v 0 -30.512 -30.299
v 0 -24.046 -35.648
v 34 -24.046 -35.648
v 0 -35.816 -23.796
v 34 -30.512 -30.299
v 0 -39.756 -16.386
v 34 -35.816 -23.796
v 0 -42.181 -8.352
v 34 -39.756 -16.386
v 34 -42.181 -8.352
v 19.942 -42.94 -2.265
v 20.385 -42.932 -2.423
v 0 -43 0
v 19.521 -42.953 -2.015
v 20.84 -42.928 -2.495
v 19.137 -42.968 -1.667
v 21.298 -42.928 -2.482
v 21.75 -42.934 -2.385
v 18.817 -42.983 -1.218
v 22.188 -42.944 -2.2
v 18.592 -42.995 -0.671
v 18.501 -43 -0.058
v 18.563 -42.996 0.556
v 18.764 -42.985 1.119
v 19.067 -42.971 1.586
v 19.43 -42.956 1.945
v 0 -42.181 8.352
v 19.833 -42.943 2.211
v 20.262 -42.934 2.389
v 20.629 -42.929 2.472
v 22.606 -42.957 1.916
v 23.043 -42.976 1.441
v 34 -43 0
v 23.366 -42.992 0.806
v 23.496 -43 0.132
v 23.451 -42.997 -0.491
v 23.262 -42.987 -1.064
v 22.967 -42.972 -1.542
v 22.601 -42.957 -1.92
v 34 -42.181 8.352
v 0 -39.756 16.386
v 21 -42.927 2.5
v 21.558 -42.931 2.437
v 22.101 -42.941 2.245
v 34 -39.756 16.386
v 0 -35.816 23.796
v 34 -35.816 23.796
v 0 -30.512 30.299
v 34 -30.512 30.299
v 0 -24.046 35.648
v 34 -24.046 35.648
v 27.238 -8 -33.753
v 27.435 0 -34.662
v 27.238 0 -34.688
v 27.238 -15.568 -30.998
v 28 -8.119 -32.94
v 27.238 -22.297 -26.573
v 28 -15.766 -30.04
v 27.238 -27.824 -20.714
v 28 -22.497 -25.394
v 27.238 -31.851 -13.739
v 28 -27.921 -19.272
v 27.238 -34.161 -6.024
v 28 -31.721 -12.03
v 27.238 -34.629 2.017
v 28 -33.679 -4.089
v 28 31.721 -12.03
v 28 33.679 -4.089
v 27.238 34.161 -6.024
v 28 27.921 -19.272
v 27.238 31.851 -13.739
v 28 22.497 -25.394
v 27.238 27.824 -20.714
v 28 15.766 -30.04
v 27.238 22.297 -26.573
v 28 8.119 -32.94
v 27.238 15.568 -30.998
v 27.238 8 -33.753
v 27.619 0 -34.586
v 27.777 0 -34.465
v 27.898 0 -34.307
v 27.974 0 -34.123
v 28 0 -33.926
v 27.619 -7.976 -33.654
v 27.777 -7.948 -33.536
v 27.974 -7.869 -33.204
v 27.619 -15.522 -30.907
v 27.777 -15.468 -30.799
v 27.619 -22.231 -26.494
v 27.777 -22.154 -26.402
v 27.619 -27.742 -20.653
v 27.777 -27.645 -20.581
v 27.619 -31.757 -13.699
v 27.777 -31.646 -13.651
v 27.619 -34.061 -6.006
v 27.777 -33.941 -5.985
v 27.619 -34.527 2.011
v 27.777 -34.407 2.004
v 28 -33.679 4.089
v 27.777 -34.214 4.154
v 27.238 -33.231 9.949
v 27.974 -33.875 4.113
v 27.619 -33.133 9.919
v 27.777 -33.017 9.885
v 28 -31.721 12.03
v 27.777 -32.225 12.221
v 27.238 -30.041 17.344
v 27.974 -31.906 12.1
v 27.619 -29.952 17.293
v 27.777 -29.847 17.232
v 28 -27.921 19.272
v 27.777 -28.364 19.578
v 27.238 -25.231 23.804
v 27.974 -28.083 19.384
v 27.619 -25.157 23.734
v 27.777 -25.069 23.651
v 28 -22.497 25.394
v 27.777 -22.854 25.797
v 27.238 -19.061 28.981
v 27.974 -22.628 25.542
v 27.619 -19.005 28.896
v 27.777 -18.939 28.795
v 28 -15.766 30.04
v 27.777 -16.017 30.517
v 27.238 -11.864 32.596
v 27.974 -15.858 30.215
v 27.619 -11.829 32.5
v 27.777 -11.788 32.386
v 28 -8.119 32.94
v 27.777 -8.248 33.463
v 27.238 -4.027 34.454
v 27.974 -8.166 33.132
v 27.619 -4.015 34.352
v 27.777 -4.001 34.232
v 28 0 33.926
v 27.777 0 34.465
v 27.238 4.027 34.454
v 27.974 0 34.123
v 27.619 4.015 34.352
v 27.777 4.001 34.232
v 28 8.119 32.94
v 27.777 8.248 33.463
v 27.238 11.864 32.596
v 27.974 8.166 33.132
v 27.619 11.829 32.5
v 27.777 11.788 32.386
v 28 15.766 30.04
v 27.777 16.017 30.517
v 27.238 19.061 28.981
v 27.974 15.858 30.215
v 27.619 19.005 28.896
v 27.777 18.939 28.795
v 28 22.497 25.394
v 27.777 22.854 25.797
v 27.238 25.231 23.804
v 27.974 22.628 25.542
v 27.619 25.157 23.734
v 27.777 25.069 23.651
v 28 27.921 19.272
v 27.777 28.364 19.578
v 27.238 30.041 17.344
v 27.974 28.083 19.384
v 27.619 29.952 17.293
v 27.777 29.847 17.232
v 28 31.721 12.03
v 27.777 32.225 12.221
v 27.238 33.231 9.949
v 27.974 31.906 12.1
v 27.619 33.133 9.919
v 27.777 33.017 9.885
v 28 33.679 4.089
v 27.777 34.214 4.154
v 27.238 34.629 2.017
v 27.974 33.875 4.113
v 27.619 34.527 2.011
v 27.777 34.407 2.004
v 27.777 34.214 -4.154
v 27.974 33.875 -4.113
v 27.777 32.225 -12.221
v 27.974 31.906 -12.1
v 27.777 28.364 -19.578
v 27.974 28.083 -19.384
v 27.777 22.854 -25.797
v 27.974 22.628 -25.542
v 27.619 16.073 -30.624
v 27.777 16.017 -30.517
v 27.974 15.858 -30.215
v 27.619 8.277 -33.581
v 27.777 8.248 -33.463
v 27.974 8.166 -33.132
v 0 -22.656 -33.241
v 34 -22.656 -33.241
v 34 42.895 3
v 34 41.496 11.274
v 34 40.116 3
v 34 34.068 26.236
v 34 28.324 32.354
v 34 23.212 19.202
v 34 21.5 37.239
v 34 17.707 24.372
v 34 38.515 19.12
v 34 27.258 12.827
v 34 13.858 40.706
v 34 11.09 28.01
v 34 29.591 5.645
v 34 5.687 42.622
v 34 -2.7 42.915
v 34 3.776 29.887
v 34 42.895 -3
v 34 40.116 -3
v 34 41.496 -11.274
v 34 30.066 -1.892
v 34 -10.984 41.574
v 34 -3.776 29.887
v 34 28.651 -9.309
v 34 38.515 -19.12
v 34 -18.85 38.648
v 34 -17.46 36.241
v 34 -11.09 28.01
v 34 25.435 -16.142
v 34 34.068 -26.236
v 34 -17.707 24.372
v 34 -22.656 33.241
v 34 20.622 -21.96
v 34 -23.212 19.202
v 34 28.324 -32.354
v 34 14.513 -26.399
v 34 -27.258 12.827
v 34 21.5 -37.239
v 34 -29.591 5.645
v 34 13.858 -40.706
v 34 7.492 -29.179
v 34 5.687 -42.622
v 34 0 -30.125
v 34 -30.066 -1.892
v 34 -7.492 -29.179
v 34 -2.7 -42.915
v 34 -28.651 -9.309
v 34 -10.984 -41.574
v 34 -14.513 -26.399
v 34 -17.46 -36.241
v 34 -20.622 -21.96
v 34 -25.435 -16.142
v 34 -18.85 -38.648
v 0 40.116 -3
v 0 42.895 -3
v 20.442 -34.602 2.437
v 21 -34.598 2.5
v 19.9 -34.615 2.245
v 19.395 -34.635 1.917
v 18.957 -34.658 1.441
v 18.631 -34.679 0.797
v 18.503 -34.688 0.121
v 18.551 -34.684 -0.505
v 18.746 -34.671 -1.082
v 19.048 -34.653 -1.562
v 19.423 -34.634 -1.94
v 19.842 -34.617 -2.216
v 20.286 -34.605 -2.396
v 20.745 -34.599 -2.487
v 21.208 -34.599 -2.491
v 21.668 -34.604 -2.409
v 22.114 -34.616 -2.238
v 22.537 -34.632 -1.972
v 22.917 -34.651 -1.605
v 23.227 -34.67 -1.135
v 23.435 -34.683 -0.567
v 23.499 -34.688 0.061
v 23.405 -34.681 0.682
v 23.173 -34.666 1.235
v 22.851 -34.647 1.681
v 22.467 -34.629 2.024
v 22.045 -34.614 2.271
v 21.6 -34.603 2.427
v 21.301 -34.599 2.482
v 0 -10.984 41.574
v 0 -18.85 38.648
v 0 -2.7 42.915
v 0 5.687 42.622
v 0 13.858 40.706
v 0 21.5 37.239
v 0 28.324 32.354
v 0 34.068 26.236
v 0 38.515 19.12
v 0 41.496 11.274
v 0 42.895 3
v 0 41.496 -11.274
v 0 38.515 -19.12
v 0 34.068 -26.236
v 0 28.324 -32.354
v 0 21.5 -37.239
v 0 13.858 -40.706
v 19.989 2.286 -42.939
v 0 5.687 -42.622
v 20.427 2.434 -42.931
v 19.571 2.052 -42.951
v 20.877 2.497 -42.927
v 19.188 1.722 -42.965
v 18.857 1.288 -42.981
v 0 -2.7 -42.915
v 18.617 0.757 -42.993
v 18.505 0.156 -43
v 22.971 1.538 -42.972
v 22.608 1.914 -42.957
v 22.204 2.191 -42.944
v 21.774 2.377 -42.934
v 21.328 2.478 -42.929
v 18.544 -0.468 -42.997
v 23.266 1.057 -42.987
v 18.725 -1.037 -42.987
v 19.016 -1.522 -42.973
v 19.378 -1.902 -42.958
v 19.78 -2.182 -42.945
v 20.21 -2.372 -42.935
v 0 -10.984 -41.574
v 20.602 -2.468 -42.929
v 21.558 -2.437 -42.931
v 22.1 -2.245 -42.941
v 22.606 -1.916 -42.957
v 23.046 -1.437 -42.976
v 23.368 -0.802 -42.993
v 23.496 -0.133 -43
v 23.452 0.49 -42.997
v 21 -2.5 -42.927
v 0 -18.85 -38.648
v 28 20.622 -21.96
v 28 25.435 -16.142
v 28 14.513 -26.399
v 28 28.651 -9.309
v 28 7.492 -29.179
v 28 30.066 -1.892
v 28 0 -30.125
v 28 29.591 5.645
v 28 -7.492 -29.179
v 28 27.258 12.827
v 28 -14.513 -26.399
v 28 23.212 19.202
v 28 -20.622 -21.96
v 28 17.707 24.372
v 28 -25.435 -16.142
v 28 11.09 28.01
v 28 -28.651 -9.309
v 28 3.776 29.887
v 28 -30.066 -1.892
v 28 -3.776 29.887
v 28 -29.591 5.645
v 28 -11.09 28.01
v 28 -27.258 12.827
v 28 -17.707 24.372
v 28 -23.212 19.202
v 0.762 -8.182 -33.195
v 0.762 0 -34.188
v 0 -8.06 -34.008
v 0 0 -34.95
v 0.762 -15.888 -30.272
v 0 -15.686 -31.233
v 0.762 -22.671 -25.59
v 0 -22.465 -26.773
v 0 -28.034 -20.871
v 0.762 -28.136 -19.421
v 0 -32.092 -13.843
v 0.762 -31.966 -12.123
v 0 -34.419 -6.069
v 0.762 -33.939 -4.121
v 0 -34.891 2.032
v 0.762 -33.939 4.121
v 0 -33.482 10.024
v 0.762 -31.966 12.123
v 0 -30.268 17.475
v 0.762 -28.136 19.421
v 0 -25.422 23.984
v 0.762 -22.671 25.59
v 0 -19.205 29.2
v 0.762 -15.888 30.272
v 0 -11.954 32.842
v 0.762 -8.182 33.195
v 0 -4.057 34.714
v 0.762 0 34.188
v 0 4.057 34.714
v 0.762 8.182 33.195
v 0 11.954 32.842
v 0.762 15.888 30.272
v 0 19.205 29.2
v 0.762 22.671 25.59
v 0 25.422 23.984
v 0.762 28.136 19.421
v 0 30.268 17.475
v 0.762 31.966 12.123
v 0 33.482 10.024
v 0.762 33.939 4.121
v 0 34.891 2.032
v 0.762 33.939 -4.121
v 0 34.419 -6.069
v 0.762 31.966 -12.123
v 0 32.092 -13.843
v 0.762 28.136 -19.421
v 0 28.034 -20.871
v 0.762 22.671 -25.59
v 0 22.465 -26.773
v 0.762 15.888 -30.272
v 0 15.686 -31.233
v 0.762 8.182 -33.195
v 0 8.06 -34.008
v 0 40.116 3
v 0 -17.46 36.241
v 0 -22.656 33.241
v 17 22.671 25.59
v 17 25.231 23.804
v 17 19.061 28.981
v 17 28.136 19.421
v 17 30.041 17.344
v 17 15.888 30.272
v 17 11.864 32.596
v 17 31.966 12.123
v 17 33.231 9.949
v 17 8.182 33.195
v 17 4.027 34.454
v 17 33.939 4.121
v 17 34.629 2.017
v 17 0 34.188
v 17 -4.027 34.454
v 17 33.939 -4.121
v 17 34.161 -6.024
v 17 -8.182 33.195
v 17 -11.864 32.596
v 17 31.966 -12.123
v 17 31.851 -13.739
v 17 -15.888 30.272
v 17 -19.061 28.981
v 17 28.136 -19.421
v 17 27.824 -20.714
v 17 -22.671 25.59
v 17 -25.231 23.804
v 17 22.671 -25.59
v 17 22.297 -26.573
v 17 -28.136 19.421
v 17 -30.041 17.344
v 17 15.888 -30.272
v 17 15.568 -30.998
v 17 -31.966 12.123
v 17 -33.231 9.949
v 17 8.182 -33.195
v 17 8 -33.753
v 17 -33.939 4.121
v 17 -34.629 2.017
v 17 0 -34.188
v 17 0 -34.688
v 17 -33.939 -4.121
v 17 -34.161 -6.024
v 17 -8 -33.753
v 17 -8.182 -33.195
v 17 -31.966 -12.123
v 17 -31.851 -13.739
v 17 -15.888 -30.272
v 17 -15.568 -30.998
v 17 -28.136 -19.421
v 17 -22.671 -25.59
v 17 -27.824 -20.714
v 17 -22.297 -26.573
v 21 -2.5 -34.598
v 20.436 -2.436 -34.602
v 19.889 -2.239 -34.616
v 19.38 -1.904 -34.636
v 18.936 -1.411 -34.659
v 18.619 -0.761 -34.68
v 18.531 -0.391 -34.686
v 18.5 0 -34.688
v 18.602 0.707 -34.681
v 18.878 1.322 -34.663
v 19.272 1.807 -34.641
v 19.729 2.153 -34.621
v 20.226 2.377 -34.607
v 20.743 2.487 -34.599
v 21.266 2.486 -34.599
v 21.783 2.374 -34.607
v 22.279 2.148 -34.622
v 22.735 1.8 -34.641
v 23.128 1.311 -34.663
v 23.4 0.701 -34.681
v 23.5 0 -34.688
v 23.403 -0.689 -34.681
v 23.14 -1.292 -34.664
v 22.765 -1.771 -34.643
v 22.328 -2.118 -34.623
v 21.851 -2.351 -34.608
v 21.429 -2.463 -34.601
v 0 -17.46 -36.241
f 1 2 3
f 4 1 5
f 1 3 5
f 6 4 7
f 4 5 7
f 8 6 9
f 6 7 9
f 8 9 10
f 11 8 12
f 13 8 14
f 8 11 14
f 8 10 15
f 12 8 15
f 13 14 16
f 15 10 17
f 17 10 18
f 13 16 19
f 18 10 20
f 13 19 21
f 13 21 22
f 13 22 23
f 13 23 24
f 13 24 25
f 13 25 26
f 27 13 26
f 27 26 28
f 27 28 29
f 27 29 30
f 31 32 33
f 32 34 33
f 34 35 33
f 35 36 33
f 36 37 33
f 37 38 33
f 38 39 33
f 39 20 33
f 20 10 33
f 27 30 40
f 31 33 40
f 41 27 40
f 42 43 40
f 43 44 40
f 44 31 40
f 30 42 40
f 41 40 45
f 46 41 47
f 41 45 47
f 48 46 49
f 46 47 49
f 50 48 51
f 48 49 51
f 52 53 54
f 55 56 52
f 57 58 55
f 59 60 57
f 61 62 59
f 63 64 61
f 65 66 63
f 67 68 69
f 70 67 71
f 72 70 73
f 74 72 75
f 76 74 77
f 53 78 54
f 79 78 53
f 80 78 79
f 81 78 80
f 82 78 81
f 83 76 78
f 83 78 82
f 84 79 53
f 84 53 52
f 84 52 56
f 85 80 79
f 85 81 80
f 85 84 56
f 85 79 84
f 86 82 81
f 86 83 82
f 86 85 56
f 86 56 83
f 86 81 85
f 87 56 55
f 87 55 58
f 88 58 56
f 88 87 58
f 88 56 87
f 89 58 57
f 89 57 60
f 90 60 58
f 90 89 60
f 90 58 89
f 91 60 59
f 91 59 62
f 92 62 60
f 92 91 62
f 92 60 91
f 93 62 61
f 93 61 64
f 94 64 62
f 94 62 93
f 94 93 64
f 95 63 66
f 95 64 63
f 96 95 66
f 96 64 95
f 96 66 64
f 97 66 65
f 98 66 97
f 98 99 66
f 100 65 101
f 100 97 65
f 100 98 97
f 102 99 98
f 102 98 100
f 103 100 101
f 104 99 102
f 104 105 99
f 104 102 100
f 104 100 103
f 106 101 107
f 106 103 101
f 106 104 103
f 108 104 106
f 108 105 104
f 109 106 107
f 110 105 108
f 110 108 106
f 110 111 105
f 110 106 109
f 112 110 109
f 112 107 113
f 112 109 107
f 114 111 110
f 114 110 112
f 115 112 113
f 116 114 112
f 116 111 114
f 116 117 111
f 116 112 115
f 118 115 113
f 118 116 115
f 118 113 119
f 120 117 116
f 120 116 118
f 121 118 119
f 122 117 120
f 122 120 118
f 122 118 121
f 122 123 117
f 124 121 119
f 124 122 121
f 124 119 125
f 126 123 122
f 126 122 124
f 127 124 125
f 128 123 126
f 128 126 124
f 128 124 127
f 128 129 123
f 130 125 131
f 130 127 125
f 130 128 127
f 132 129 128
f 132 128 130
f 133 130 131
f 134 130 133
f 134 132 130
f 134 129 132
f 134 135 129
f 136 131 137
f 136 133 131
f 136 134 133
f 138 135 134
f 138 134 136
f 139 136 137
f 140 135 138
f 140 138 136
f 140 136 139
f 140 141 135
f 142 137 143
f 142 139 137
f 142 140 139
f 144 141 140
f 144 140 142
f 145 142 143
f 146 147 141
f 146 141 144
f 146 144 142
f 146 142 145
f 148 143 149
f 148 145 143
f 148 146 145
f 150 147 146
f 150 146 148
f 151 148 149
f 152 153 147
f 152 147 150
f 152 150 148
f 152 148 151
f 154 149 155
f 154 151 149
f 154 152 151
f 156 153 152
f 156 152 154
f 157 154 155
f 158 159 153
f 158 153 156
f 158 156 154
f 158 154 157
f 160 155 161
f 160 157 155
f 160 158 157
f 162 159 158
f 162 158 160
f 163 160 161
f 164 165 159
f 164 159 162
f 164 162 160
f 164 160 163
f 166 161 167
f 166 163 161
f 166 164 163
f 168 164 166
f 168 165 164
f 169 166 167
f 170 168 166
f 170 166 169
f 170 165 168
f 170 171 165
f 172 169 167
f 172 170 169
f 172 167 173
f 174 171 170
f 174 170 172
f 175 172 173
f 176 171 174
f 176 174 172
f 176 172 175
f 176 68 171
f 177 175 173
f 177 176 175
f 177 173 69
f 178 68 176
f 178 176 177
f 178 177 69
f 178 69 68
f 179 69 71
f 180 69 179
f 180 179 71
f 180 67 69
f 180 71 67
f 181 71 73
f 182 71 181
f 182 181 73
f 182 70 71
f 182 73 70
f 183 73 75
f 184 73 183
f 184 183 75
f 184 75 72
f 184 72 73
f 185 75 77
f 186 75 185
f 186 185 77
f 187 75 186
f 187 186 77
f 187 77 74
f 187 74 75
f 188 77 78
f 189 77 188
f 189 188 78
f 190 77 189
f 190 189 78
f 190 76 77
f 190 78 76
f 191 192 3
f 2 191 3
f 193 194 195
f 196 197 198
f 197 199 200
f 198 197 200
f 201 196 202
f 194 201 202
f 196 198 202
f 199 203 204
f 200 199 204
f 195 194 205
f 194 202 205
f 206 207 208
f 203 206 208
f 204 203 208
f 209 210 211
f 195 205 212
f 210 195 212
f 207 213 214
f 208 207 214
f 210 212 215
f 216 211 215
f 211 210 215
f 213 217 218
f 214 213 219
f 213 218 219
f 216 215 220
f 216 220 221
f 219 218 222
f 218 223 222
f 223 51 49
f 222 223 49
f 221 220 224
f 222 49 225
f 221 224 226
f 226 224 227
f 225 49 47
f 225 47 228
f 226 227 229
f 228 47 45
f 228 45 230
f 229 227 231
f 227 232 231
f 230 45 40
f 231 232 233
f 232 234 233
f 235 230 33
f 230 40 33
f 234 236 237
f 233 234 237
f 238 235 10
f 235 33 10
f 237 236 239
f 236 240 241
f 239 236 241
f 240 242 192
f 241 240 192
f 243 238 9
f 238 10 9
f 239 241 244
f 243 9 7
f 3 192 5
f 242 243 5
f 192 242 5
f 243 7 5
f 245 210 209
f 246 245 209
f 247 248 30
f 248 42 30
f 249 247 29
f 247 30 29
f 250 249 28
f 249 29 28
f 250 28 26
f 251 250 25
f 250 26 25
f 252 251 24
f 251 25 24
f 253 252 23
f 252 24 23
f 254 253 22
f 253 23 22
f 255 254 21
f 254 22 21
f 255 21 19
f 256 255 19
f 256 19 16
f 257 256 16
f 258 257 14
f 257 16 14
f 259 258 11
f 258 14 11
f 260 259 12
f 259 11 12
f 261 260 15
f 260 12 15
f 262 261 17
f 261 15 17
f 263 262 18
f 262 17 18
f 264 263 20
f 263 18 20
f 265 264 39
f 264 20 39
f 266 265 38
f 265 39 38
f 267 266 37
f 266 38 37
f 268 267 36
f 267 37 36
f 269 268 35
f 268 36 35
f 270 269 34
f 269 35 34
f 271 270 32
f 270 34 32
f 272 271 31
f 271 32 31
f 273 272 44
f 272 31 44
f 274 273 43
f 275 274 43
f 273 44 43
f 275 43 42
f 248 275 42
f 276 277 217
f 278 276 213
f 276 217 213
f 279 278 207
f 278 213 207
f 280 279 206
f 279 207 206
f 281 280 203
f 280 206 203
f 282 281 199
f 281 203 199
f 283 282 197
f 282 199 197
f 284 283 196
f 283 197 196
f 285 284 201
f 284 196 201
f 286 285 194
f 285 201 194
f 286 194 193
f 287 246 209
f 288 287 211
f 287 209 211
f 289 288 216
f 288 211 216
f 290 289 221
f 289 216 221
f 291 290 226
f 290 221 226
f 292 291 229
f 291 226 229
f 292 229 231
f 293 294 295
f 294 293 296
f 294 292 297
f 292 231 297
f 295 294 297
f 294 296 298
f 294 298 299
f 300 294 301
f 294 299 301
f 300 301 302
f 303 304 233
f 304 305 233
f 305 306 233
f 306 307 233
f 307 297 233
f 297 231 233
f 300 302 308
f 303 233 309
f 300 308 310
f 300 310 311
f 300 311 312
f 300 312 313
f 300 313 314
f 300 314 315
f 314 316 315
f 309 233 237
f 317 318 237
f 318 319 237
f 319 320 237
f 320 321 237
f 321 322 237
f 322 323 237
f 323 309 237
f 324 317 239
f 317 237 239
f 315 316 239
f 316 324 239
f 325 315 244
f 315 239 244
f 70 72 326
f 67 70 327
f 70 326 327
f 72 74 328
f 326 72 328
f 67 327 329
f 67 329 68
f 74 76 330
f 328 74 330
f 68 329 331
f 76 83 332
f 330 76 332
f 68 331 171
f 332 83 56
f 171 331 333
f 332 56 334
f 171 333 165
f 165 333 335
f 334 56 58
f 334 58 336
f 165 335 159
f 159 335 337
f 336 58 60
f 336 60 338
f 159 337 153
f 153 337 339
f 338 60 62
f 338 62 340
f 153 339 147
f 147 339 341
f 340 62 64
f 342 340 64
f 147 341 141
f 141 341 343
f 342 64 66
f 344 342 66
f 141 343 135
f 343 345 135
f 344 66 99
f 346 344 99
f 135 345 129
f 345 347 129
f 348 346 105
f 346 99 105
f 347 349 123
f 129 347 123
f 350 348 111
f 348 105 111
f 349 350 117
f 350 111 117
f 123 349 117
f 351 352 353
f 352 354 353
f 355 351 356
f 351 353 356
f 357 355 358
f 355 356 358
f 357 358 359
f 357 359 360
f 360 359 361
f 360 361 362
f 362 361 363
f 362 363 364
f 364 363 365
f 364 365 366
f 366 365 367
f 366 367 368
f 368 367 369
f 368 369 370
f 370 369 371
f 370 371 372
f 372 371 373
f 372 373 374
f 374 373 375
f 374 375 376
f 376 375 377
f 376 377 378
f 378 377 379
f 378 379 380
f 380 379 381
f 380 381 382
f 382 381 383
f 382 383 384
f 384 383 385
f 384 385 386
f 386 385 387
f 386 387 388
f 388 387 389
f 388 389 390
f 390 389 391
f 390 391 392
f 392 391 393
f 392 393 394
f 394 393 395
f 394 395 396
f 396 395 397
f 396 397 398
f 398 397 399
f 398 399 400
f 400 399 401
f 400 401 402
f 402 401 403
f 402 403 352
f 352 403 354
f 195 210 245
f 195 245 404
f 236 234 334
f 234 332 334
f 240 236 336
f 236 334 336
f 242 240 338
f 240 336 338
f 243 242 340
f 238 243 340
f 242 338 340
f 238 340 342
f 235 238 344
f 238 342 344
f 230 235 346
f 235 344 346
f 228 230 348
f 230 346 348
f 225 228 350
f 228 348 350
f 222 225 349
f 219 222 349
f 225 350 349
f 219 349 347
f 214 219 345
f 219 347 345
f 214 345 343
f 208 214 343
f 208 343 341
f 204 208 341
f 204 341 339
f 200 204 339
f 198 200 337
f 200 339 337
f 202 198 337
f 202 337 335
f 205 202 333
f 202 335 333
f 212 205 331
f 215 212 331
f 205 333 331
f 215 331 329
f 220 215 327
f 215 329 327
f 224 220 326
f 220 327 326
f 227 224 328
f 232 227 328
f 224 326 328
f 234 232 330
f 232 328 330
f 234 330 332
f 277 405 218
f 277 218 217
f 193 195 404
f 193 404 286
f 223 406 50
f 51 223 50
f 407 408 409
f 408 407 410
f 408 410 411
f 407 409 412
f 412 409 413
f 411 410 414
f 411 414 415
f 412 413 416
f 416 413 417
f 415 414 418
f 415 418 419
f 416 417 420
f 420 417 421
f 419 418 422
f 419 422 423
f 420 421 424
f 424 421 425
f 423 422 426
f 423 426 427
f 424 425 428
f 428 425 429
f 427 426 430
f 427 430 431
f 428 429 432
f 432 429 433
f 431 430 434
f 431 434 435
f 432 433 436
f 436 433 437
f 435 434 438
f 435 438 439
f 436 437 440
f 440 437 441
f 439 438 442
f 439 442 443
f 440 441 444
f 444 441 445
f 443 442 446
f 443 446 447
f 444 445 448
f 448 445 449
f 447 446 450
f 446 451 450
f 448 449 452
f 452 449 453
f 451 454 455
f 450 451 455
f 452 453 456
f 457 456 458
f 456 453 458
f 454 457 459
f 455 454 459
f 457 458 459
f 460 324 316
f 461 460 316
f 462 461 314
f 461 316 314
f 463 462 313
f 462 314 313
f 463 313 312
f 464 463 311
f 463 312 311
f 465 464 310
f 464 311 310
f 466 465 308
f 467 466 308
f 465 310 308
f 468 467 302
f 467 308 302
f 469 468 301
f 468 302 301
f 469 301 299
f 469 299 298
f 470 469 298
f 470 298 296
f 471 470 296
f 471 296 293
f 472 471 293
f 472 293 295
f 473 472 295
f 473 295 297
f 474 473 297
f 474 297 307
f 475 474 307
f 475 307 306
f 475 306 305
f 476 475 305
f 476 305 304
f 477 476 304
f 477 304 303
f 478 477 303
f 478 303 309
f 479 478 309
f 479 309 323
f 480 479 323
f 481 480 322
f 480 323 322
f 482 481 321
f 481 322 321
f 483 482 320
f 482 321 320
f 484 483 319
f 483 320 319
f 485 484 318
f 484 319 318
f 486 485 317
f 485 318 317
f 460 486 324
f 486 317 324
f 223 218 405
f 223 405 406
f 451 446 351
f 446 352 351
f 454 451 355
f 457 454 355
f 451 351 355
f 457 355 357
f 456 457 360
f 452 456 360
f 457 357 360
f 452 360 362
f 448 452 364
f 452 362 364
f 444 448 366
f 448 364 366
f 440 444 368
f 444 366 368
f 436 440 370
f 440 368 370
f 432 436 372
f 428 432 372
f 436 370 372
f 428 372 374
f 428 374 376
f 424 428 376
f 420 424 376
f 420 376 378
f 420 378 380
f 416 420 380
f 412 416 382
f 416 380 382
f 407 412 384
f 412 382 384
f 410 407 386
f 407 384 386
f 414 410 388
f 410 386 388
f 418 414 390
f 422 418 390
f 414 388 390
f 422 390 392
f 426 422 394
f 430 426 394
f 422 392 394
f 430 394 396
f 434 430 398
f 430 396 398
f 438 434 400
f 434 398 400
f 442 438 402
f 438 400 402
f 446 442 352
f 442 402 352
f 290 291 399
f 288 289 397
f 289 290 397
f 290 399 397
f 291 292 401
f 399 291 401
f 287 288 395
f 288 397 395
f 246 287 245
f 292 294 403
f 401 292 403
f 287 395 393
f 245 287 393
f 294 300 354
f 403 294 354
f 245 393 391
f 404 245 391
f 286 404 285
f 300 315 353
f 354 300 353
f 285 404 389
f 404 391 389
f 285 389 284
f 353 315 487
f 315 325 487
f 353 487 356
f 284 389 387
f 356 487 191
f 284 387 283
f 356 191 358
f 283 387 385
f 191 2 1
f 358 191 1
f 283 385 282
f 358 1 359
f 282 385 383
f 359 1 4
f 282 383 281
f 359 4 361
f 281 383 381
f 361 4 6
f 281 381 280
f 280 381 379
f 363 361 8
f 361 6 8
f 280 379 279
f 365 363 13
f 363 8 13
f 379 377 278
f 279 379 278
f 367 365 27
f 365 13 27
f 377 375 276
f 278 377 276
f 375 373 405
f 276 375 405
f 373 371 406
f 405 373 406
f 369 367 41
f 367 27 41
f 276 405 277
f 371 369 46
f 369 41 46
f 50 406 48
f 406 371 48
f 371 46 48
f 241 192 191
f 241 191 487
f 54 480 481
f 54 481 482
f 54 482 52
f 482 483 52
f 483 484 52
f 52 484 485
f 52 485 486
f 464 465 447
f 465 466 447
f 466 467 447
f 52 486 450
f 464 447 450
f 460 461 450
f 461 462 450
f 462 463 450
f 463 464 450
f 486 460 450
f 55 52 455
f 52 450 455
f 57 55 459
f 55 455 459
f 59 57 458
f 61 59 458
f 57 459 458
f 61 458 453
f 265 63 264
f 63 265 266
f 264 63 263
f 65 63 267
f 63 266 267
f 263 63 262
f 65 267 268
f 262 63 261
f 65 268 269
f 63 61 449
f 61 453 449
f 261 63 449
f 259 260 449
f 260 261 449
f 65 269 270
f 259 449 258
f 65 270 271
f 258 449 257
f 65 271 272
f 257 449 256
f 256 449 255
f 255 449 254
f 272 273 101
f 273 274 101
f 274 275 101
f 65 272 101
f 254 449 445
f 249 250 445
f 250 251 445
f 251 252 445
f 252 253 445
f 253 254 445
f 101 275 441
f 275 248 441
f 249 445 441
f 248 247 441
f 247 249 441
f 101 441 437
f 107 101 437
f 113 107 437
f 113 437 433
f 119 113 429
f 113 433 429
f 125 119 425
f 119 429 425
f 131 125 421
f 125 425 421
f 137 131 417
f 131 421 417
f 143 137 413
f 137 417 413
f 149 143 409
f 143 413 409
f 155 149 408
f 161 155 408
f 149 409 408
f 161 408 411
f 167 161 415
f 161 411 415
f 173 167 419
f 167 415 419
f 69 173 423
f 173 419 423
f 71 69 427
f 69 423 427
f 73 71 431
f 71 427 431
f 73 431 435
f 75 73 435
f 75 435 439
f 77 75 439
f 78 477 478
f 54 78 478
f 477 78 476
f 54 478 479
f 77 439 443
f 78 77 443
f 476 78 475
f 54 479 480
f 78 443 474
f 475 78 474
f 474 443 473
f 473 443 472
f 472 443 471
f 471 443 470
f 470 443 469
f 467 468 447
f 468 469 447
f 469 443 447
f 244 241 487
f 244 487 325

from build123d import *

# Parameters (mm, degrees)
SKETCH2_W          = 6
SKETCH2_H          = 3.873628034
CUT_EXTRUDE1_DEPTH = 70.670653793
CIRPATTERN1_COUNT  = 3
SKETCH4_W          = 2.5
SKETCH4_H          = 43
CIRPATTERN2_COUNT  = 2
CIRPATTERN2_ANGLE  = 90
FILLET1_R          = 0.762


with BuildPart() as part:
    # Sketch1 → Revolve1 (revolve)
    with BuildSketch(Plane.XY, mode=Mode.PRIVATE) as revolve1_sk:
        Polygon((0, 34.9501), (0, 43), (34, 43), (34, 30.125), (28, 30.125), (28, 34.6881), (17, 34.6881), (17, 34.1881), (0.762, 34.1881), align=None)
    revolve(revolve1_sk.sketch.rotate(Axis((0, 0, 0), (-1, 0, 0)), 90), axis=Axis((0, 0, 0), (-1, 0, 0)))

    # Sketch2 → Cut-Extrude1 (cut, through all)
    with BuildSketch(Plane.ZY):
        with Locations((0, 42.052814017)):
            Rectangle(SKETCH2_W, SKETCH2_H)
    cut_extrude1 = extrude(amount=-CUT_EXTRUDE1_DEPTH, mode=Mode.SUBTRACT)

    # CirPattern1: Cut-Extrude1 ×3 about axis
    cirpattern1_axis = Axis((0, 0, 0), (1, 0, 0))
    for i in range(1, CIRPATTERN1_COUNT):
        add(cut_extrude1.rotate(cirpattern1_axis, i * 360 / CIRPATTERN1_COUNT), mode=Mode.SUBTRACT)

    # Sketch4 → M6 Tapped Hole1 (revolve, cut)
    with BuildSketch(Plane(origin=(21, 0, 0), x_dir=(0, 0, 1), z_dir=(1, 0, 0))):
        with Locations((1.25, 21.5)):
            Rectangle(SKETCH4_W, SKETCH4_H)
    m6_tapped_hole1 = revolve(axis=Axis((21, 6.35, 0), (0, -1, 0)), mode=Mode.SUBTRACT)

    # CirPattern2: M6 Tapped Hole1 ×2 about axis
    cirpattern2_axis = Axis((0, 0, 0), (1, 0, 0))
    for i in range(1, CIRPATTERN2_COUNT):
        add(m6_tapped_hole1.rotate(cirpattern2_axis, i * CIRPATTERN2_ANGLE / (CIRPATTERN2_COUNT - 1)), mode=Mode.SUBTRACT)

    # Fillet1
    fillet1_edges = [part.edges().sort_by_distance(p)[0] for p in [
        (28, 0, 34.6881),
    ]]
    fillet(fillet1_edges, radius=FILLET1_R)


solid = part.part
